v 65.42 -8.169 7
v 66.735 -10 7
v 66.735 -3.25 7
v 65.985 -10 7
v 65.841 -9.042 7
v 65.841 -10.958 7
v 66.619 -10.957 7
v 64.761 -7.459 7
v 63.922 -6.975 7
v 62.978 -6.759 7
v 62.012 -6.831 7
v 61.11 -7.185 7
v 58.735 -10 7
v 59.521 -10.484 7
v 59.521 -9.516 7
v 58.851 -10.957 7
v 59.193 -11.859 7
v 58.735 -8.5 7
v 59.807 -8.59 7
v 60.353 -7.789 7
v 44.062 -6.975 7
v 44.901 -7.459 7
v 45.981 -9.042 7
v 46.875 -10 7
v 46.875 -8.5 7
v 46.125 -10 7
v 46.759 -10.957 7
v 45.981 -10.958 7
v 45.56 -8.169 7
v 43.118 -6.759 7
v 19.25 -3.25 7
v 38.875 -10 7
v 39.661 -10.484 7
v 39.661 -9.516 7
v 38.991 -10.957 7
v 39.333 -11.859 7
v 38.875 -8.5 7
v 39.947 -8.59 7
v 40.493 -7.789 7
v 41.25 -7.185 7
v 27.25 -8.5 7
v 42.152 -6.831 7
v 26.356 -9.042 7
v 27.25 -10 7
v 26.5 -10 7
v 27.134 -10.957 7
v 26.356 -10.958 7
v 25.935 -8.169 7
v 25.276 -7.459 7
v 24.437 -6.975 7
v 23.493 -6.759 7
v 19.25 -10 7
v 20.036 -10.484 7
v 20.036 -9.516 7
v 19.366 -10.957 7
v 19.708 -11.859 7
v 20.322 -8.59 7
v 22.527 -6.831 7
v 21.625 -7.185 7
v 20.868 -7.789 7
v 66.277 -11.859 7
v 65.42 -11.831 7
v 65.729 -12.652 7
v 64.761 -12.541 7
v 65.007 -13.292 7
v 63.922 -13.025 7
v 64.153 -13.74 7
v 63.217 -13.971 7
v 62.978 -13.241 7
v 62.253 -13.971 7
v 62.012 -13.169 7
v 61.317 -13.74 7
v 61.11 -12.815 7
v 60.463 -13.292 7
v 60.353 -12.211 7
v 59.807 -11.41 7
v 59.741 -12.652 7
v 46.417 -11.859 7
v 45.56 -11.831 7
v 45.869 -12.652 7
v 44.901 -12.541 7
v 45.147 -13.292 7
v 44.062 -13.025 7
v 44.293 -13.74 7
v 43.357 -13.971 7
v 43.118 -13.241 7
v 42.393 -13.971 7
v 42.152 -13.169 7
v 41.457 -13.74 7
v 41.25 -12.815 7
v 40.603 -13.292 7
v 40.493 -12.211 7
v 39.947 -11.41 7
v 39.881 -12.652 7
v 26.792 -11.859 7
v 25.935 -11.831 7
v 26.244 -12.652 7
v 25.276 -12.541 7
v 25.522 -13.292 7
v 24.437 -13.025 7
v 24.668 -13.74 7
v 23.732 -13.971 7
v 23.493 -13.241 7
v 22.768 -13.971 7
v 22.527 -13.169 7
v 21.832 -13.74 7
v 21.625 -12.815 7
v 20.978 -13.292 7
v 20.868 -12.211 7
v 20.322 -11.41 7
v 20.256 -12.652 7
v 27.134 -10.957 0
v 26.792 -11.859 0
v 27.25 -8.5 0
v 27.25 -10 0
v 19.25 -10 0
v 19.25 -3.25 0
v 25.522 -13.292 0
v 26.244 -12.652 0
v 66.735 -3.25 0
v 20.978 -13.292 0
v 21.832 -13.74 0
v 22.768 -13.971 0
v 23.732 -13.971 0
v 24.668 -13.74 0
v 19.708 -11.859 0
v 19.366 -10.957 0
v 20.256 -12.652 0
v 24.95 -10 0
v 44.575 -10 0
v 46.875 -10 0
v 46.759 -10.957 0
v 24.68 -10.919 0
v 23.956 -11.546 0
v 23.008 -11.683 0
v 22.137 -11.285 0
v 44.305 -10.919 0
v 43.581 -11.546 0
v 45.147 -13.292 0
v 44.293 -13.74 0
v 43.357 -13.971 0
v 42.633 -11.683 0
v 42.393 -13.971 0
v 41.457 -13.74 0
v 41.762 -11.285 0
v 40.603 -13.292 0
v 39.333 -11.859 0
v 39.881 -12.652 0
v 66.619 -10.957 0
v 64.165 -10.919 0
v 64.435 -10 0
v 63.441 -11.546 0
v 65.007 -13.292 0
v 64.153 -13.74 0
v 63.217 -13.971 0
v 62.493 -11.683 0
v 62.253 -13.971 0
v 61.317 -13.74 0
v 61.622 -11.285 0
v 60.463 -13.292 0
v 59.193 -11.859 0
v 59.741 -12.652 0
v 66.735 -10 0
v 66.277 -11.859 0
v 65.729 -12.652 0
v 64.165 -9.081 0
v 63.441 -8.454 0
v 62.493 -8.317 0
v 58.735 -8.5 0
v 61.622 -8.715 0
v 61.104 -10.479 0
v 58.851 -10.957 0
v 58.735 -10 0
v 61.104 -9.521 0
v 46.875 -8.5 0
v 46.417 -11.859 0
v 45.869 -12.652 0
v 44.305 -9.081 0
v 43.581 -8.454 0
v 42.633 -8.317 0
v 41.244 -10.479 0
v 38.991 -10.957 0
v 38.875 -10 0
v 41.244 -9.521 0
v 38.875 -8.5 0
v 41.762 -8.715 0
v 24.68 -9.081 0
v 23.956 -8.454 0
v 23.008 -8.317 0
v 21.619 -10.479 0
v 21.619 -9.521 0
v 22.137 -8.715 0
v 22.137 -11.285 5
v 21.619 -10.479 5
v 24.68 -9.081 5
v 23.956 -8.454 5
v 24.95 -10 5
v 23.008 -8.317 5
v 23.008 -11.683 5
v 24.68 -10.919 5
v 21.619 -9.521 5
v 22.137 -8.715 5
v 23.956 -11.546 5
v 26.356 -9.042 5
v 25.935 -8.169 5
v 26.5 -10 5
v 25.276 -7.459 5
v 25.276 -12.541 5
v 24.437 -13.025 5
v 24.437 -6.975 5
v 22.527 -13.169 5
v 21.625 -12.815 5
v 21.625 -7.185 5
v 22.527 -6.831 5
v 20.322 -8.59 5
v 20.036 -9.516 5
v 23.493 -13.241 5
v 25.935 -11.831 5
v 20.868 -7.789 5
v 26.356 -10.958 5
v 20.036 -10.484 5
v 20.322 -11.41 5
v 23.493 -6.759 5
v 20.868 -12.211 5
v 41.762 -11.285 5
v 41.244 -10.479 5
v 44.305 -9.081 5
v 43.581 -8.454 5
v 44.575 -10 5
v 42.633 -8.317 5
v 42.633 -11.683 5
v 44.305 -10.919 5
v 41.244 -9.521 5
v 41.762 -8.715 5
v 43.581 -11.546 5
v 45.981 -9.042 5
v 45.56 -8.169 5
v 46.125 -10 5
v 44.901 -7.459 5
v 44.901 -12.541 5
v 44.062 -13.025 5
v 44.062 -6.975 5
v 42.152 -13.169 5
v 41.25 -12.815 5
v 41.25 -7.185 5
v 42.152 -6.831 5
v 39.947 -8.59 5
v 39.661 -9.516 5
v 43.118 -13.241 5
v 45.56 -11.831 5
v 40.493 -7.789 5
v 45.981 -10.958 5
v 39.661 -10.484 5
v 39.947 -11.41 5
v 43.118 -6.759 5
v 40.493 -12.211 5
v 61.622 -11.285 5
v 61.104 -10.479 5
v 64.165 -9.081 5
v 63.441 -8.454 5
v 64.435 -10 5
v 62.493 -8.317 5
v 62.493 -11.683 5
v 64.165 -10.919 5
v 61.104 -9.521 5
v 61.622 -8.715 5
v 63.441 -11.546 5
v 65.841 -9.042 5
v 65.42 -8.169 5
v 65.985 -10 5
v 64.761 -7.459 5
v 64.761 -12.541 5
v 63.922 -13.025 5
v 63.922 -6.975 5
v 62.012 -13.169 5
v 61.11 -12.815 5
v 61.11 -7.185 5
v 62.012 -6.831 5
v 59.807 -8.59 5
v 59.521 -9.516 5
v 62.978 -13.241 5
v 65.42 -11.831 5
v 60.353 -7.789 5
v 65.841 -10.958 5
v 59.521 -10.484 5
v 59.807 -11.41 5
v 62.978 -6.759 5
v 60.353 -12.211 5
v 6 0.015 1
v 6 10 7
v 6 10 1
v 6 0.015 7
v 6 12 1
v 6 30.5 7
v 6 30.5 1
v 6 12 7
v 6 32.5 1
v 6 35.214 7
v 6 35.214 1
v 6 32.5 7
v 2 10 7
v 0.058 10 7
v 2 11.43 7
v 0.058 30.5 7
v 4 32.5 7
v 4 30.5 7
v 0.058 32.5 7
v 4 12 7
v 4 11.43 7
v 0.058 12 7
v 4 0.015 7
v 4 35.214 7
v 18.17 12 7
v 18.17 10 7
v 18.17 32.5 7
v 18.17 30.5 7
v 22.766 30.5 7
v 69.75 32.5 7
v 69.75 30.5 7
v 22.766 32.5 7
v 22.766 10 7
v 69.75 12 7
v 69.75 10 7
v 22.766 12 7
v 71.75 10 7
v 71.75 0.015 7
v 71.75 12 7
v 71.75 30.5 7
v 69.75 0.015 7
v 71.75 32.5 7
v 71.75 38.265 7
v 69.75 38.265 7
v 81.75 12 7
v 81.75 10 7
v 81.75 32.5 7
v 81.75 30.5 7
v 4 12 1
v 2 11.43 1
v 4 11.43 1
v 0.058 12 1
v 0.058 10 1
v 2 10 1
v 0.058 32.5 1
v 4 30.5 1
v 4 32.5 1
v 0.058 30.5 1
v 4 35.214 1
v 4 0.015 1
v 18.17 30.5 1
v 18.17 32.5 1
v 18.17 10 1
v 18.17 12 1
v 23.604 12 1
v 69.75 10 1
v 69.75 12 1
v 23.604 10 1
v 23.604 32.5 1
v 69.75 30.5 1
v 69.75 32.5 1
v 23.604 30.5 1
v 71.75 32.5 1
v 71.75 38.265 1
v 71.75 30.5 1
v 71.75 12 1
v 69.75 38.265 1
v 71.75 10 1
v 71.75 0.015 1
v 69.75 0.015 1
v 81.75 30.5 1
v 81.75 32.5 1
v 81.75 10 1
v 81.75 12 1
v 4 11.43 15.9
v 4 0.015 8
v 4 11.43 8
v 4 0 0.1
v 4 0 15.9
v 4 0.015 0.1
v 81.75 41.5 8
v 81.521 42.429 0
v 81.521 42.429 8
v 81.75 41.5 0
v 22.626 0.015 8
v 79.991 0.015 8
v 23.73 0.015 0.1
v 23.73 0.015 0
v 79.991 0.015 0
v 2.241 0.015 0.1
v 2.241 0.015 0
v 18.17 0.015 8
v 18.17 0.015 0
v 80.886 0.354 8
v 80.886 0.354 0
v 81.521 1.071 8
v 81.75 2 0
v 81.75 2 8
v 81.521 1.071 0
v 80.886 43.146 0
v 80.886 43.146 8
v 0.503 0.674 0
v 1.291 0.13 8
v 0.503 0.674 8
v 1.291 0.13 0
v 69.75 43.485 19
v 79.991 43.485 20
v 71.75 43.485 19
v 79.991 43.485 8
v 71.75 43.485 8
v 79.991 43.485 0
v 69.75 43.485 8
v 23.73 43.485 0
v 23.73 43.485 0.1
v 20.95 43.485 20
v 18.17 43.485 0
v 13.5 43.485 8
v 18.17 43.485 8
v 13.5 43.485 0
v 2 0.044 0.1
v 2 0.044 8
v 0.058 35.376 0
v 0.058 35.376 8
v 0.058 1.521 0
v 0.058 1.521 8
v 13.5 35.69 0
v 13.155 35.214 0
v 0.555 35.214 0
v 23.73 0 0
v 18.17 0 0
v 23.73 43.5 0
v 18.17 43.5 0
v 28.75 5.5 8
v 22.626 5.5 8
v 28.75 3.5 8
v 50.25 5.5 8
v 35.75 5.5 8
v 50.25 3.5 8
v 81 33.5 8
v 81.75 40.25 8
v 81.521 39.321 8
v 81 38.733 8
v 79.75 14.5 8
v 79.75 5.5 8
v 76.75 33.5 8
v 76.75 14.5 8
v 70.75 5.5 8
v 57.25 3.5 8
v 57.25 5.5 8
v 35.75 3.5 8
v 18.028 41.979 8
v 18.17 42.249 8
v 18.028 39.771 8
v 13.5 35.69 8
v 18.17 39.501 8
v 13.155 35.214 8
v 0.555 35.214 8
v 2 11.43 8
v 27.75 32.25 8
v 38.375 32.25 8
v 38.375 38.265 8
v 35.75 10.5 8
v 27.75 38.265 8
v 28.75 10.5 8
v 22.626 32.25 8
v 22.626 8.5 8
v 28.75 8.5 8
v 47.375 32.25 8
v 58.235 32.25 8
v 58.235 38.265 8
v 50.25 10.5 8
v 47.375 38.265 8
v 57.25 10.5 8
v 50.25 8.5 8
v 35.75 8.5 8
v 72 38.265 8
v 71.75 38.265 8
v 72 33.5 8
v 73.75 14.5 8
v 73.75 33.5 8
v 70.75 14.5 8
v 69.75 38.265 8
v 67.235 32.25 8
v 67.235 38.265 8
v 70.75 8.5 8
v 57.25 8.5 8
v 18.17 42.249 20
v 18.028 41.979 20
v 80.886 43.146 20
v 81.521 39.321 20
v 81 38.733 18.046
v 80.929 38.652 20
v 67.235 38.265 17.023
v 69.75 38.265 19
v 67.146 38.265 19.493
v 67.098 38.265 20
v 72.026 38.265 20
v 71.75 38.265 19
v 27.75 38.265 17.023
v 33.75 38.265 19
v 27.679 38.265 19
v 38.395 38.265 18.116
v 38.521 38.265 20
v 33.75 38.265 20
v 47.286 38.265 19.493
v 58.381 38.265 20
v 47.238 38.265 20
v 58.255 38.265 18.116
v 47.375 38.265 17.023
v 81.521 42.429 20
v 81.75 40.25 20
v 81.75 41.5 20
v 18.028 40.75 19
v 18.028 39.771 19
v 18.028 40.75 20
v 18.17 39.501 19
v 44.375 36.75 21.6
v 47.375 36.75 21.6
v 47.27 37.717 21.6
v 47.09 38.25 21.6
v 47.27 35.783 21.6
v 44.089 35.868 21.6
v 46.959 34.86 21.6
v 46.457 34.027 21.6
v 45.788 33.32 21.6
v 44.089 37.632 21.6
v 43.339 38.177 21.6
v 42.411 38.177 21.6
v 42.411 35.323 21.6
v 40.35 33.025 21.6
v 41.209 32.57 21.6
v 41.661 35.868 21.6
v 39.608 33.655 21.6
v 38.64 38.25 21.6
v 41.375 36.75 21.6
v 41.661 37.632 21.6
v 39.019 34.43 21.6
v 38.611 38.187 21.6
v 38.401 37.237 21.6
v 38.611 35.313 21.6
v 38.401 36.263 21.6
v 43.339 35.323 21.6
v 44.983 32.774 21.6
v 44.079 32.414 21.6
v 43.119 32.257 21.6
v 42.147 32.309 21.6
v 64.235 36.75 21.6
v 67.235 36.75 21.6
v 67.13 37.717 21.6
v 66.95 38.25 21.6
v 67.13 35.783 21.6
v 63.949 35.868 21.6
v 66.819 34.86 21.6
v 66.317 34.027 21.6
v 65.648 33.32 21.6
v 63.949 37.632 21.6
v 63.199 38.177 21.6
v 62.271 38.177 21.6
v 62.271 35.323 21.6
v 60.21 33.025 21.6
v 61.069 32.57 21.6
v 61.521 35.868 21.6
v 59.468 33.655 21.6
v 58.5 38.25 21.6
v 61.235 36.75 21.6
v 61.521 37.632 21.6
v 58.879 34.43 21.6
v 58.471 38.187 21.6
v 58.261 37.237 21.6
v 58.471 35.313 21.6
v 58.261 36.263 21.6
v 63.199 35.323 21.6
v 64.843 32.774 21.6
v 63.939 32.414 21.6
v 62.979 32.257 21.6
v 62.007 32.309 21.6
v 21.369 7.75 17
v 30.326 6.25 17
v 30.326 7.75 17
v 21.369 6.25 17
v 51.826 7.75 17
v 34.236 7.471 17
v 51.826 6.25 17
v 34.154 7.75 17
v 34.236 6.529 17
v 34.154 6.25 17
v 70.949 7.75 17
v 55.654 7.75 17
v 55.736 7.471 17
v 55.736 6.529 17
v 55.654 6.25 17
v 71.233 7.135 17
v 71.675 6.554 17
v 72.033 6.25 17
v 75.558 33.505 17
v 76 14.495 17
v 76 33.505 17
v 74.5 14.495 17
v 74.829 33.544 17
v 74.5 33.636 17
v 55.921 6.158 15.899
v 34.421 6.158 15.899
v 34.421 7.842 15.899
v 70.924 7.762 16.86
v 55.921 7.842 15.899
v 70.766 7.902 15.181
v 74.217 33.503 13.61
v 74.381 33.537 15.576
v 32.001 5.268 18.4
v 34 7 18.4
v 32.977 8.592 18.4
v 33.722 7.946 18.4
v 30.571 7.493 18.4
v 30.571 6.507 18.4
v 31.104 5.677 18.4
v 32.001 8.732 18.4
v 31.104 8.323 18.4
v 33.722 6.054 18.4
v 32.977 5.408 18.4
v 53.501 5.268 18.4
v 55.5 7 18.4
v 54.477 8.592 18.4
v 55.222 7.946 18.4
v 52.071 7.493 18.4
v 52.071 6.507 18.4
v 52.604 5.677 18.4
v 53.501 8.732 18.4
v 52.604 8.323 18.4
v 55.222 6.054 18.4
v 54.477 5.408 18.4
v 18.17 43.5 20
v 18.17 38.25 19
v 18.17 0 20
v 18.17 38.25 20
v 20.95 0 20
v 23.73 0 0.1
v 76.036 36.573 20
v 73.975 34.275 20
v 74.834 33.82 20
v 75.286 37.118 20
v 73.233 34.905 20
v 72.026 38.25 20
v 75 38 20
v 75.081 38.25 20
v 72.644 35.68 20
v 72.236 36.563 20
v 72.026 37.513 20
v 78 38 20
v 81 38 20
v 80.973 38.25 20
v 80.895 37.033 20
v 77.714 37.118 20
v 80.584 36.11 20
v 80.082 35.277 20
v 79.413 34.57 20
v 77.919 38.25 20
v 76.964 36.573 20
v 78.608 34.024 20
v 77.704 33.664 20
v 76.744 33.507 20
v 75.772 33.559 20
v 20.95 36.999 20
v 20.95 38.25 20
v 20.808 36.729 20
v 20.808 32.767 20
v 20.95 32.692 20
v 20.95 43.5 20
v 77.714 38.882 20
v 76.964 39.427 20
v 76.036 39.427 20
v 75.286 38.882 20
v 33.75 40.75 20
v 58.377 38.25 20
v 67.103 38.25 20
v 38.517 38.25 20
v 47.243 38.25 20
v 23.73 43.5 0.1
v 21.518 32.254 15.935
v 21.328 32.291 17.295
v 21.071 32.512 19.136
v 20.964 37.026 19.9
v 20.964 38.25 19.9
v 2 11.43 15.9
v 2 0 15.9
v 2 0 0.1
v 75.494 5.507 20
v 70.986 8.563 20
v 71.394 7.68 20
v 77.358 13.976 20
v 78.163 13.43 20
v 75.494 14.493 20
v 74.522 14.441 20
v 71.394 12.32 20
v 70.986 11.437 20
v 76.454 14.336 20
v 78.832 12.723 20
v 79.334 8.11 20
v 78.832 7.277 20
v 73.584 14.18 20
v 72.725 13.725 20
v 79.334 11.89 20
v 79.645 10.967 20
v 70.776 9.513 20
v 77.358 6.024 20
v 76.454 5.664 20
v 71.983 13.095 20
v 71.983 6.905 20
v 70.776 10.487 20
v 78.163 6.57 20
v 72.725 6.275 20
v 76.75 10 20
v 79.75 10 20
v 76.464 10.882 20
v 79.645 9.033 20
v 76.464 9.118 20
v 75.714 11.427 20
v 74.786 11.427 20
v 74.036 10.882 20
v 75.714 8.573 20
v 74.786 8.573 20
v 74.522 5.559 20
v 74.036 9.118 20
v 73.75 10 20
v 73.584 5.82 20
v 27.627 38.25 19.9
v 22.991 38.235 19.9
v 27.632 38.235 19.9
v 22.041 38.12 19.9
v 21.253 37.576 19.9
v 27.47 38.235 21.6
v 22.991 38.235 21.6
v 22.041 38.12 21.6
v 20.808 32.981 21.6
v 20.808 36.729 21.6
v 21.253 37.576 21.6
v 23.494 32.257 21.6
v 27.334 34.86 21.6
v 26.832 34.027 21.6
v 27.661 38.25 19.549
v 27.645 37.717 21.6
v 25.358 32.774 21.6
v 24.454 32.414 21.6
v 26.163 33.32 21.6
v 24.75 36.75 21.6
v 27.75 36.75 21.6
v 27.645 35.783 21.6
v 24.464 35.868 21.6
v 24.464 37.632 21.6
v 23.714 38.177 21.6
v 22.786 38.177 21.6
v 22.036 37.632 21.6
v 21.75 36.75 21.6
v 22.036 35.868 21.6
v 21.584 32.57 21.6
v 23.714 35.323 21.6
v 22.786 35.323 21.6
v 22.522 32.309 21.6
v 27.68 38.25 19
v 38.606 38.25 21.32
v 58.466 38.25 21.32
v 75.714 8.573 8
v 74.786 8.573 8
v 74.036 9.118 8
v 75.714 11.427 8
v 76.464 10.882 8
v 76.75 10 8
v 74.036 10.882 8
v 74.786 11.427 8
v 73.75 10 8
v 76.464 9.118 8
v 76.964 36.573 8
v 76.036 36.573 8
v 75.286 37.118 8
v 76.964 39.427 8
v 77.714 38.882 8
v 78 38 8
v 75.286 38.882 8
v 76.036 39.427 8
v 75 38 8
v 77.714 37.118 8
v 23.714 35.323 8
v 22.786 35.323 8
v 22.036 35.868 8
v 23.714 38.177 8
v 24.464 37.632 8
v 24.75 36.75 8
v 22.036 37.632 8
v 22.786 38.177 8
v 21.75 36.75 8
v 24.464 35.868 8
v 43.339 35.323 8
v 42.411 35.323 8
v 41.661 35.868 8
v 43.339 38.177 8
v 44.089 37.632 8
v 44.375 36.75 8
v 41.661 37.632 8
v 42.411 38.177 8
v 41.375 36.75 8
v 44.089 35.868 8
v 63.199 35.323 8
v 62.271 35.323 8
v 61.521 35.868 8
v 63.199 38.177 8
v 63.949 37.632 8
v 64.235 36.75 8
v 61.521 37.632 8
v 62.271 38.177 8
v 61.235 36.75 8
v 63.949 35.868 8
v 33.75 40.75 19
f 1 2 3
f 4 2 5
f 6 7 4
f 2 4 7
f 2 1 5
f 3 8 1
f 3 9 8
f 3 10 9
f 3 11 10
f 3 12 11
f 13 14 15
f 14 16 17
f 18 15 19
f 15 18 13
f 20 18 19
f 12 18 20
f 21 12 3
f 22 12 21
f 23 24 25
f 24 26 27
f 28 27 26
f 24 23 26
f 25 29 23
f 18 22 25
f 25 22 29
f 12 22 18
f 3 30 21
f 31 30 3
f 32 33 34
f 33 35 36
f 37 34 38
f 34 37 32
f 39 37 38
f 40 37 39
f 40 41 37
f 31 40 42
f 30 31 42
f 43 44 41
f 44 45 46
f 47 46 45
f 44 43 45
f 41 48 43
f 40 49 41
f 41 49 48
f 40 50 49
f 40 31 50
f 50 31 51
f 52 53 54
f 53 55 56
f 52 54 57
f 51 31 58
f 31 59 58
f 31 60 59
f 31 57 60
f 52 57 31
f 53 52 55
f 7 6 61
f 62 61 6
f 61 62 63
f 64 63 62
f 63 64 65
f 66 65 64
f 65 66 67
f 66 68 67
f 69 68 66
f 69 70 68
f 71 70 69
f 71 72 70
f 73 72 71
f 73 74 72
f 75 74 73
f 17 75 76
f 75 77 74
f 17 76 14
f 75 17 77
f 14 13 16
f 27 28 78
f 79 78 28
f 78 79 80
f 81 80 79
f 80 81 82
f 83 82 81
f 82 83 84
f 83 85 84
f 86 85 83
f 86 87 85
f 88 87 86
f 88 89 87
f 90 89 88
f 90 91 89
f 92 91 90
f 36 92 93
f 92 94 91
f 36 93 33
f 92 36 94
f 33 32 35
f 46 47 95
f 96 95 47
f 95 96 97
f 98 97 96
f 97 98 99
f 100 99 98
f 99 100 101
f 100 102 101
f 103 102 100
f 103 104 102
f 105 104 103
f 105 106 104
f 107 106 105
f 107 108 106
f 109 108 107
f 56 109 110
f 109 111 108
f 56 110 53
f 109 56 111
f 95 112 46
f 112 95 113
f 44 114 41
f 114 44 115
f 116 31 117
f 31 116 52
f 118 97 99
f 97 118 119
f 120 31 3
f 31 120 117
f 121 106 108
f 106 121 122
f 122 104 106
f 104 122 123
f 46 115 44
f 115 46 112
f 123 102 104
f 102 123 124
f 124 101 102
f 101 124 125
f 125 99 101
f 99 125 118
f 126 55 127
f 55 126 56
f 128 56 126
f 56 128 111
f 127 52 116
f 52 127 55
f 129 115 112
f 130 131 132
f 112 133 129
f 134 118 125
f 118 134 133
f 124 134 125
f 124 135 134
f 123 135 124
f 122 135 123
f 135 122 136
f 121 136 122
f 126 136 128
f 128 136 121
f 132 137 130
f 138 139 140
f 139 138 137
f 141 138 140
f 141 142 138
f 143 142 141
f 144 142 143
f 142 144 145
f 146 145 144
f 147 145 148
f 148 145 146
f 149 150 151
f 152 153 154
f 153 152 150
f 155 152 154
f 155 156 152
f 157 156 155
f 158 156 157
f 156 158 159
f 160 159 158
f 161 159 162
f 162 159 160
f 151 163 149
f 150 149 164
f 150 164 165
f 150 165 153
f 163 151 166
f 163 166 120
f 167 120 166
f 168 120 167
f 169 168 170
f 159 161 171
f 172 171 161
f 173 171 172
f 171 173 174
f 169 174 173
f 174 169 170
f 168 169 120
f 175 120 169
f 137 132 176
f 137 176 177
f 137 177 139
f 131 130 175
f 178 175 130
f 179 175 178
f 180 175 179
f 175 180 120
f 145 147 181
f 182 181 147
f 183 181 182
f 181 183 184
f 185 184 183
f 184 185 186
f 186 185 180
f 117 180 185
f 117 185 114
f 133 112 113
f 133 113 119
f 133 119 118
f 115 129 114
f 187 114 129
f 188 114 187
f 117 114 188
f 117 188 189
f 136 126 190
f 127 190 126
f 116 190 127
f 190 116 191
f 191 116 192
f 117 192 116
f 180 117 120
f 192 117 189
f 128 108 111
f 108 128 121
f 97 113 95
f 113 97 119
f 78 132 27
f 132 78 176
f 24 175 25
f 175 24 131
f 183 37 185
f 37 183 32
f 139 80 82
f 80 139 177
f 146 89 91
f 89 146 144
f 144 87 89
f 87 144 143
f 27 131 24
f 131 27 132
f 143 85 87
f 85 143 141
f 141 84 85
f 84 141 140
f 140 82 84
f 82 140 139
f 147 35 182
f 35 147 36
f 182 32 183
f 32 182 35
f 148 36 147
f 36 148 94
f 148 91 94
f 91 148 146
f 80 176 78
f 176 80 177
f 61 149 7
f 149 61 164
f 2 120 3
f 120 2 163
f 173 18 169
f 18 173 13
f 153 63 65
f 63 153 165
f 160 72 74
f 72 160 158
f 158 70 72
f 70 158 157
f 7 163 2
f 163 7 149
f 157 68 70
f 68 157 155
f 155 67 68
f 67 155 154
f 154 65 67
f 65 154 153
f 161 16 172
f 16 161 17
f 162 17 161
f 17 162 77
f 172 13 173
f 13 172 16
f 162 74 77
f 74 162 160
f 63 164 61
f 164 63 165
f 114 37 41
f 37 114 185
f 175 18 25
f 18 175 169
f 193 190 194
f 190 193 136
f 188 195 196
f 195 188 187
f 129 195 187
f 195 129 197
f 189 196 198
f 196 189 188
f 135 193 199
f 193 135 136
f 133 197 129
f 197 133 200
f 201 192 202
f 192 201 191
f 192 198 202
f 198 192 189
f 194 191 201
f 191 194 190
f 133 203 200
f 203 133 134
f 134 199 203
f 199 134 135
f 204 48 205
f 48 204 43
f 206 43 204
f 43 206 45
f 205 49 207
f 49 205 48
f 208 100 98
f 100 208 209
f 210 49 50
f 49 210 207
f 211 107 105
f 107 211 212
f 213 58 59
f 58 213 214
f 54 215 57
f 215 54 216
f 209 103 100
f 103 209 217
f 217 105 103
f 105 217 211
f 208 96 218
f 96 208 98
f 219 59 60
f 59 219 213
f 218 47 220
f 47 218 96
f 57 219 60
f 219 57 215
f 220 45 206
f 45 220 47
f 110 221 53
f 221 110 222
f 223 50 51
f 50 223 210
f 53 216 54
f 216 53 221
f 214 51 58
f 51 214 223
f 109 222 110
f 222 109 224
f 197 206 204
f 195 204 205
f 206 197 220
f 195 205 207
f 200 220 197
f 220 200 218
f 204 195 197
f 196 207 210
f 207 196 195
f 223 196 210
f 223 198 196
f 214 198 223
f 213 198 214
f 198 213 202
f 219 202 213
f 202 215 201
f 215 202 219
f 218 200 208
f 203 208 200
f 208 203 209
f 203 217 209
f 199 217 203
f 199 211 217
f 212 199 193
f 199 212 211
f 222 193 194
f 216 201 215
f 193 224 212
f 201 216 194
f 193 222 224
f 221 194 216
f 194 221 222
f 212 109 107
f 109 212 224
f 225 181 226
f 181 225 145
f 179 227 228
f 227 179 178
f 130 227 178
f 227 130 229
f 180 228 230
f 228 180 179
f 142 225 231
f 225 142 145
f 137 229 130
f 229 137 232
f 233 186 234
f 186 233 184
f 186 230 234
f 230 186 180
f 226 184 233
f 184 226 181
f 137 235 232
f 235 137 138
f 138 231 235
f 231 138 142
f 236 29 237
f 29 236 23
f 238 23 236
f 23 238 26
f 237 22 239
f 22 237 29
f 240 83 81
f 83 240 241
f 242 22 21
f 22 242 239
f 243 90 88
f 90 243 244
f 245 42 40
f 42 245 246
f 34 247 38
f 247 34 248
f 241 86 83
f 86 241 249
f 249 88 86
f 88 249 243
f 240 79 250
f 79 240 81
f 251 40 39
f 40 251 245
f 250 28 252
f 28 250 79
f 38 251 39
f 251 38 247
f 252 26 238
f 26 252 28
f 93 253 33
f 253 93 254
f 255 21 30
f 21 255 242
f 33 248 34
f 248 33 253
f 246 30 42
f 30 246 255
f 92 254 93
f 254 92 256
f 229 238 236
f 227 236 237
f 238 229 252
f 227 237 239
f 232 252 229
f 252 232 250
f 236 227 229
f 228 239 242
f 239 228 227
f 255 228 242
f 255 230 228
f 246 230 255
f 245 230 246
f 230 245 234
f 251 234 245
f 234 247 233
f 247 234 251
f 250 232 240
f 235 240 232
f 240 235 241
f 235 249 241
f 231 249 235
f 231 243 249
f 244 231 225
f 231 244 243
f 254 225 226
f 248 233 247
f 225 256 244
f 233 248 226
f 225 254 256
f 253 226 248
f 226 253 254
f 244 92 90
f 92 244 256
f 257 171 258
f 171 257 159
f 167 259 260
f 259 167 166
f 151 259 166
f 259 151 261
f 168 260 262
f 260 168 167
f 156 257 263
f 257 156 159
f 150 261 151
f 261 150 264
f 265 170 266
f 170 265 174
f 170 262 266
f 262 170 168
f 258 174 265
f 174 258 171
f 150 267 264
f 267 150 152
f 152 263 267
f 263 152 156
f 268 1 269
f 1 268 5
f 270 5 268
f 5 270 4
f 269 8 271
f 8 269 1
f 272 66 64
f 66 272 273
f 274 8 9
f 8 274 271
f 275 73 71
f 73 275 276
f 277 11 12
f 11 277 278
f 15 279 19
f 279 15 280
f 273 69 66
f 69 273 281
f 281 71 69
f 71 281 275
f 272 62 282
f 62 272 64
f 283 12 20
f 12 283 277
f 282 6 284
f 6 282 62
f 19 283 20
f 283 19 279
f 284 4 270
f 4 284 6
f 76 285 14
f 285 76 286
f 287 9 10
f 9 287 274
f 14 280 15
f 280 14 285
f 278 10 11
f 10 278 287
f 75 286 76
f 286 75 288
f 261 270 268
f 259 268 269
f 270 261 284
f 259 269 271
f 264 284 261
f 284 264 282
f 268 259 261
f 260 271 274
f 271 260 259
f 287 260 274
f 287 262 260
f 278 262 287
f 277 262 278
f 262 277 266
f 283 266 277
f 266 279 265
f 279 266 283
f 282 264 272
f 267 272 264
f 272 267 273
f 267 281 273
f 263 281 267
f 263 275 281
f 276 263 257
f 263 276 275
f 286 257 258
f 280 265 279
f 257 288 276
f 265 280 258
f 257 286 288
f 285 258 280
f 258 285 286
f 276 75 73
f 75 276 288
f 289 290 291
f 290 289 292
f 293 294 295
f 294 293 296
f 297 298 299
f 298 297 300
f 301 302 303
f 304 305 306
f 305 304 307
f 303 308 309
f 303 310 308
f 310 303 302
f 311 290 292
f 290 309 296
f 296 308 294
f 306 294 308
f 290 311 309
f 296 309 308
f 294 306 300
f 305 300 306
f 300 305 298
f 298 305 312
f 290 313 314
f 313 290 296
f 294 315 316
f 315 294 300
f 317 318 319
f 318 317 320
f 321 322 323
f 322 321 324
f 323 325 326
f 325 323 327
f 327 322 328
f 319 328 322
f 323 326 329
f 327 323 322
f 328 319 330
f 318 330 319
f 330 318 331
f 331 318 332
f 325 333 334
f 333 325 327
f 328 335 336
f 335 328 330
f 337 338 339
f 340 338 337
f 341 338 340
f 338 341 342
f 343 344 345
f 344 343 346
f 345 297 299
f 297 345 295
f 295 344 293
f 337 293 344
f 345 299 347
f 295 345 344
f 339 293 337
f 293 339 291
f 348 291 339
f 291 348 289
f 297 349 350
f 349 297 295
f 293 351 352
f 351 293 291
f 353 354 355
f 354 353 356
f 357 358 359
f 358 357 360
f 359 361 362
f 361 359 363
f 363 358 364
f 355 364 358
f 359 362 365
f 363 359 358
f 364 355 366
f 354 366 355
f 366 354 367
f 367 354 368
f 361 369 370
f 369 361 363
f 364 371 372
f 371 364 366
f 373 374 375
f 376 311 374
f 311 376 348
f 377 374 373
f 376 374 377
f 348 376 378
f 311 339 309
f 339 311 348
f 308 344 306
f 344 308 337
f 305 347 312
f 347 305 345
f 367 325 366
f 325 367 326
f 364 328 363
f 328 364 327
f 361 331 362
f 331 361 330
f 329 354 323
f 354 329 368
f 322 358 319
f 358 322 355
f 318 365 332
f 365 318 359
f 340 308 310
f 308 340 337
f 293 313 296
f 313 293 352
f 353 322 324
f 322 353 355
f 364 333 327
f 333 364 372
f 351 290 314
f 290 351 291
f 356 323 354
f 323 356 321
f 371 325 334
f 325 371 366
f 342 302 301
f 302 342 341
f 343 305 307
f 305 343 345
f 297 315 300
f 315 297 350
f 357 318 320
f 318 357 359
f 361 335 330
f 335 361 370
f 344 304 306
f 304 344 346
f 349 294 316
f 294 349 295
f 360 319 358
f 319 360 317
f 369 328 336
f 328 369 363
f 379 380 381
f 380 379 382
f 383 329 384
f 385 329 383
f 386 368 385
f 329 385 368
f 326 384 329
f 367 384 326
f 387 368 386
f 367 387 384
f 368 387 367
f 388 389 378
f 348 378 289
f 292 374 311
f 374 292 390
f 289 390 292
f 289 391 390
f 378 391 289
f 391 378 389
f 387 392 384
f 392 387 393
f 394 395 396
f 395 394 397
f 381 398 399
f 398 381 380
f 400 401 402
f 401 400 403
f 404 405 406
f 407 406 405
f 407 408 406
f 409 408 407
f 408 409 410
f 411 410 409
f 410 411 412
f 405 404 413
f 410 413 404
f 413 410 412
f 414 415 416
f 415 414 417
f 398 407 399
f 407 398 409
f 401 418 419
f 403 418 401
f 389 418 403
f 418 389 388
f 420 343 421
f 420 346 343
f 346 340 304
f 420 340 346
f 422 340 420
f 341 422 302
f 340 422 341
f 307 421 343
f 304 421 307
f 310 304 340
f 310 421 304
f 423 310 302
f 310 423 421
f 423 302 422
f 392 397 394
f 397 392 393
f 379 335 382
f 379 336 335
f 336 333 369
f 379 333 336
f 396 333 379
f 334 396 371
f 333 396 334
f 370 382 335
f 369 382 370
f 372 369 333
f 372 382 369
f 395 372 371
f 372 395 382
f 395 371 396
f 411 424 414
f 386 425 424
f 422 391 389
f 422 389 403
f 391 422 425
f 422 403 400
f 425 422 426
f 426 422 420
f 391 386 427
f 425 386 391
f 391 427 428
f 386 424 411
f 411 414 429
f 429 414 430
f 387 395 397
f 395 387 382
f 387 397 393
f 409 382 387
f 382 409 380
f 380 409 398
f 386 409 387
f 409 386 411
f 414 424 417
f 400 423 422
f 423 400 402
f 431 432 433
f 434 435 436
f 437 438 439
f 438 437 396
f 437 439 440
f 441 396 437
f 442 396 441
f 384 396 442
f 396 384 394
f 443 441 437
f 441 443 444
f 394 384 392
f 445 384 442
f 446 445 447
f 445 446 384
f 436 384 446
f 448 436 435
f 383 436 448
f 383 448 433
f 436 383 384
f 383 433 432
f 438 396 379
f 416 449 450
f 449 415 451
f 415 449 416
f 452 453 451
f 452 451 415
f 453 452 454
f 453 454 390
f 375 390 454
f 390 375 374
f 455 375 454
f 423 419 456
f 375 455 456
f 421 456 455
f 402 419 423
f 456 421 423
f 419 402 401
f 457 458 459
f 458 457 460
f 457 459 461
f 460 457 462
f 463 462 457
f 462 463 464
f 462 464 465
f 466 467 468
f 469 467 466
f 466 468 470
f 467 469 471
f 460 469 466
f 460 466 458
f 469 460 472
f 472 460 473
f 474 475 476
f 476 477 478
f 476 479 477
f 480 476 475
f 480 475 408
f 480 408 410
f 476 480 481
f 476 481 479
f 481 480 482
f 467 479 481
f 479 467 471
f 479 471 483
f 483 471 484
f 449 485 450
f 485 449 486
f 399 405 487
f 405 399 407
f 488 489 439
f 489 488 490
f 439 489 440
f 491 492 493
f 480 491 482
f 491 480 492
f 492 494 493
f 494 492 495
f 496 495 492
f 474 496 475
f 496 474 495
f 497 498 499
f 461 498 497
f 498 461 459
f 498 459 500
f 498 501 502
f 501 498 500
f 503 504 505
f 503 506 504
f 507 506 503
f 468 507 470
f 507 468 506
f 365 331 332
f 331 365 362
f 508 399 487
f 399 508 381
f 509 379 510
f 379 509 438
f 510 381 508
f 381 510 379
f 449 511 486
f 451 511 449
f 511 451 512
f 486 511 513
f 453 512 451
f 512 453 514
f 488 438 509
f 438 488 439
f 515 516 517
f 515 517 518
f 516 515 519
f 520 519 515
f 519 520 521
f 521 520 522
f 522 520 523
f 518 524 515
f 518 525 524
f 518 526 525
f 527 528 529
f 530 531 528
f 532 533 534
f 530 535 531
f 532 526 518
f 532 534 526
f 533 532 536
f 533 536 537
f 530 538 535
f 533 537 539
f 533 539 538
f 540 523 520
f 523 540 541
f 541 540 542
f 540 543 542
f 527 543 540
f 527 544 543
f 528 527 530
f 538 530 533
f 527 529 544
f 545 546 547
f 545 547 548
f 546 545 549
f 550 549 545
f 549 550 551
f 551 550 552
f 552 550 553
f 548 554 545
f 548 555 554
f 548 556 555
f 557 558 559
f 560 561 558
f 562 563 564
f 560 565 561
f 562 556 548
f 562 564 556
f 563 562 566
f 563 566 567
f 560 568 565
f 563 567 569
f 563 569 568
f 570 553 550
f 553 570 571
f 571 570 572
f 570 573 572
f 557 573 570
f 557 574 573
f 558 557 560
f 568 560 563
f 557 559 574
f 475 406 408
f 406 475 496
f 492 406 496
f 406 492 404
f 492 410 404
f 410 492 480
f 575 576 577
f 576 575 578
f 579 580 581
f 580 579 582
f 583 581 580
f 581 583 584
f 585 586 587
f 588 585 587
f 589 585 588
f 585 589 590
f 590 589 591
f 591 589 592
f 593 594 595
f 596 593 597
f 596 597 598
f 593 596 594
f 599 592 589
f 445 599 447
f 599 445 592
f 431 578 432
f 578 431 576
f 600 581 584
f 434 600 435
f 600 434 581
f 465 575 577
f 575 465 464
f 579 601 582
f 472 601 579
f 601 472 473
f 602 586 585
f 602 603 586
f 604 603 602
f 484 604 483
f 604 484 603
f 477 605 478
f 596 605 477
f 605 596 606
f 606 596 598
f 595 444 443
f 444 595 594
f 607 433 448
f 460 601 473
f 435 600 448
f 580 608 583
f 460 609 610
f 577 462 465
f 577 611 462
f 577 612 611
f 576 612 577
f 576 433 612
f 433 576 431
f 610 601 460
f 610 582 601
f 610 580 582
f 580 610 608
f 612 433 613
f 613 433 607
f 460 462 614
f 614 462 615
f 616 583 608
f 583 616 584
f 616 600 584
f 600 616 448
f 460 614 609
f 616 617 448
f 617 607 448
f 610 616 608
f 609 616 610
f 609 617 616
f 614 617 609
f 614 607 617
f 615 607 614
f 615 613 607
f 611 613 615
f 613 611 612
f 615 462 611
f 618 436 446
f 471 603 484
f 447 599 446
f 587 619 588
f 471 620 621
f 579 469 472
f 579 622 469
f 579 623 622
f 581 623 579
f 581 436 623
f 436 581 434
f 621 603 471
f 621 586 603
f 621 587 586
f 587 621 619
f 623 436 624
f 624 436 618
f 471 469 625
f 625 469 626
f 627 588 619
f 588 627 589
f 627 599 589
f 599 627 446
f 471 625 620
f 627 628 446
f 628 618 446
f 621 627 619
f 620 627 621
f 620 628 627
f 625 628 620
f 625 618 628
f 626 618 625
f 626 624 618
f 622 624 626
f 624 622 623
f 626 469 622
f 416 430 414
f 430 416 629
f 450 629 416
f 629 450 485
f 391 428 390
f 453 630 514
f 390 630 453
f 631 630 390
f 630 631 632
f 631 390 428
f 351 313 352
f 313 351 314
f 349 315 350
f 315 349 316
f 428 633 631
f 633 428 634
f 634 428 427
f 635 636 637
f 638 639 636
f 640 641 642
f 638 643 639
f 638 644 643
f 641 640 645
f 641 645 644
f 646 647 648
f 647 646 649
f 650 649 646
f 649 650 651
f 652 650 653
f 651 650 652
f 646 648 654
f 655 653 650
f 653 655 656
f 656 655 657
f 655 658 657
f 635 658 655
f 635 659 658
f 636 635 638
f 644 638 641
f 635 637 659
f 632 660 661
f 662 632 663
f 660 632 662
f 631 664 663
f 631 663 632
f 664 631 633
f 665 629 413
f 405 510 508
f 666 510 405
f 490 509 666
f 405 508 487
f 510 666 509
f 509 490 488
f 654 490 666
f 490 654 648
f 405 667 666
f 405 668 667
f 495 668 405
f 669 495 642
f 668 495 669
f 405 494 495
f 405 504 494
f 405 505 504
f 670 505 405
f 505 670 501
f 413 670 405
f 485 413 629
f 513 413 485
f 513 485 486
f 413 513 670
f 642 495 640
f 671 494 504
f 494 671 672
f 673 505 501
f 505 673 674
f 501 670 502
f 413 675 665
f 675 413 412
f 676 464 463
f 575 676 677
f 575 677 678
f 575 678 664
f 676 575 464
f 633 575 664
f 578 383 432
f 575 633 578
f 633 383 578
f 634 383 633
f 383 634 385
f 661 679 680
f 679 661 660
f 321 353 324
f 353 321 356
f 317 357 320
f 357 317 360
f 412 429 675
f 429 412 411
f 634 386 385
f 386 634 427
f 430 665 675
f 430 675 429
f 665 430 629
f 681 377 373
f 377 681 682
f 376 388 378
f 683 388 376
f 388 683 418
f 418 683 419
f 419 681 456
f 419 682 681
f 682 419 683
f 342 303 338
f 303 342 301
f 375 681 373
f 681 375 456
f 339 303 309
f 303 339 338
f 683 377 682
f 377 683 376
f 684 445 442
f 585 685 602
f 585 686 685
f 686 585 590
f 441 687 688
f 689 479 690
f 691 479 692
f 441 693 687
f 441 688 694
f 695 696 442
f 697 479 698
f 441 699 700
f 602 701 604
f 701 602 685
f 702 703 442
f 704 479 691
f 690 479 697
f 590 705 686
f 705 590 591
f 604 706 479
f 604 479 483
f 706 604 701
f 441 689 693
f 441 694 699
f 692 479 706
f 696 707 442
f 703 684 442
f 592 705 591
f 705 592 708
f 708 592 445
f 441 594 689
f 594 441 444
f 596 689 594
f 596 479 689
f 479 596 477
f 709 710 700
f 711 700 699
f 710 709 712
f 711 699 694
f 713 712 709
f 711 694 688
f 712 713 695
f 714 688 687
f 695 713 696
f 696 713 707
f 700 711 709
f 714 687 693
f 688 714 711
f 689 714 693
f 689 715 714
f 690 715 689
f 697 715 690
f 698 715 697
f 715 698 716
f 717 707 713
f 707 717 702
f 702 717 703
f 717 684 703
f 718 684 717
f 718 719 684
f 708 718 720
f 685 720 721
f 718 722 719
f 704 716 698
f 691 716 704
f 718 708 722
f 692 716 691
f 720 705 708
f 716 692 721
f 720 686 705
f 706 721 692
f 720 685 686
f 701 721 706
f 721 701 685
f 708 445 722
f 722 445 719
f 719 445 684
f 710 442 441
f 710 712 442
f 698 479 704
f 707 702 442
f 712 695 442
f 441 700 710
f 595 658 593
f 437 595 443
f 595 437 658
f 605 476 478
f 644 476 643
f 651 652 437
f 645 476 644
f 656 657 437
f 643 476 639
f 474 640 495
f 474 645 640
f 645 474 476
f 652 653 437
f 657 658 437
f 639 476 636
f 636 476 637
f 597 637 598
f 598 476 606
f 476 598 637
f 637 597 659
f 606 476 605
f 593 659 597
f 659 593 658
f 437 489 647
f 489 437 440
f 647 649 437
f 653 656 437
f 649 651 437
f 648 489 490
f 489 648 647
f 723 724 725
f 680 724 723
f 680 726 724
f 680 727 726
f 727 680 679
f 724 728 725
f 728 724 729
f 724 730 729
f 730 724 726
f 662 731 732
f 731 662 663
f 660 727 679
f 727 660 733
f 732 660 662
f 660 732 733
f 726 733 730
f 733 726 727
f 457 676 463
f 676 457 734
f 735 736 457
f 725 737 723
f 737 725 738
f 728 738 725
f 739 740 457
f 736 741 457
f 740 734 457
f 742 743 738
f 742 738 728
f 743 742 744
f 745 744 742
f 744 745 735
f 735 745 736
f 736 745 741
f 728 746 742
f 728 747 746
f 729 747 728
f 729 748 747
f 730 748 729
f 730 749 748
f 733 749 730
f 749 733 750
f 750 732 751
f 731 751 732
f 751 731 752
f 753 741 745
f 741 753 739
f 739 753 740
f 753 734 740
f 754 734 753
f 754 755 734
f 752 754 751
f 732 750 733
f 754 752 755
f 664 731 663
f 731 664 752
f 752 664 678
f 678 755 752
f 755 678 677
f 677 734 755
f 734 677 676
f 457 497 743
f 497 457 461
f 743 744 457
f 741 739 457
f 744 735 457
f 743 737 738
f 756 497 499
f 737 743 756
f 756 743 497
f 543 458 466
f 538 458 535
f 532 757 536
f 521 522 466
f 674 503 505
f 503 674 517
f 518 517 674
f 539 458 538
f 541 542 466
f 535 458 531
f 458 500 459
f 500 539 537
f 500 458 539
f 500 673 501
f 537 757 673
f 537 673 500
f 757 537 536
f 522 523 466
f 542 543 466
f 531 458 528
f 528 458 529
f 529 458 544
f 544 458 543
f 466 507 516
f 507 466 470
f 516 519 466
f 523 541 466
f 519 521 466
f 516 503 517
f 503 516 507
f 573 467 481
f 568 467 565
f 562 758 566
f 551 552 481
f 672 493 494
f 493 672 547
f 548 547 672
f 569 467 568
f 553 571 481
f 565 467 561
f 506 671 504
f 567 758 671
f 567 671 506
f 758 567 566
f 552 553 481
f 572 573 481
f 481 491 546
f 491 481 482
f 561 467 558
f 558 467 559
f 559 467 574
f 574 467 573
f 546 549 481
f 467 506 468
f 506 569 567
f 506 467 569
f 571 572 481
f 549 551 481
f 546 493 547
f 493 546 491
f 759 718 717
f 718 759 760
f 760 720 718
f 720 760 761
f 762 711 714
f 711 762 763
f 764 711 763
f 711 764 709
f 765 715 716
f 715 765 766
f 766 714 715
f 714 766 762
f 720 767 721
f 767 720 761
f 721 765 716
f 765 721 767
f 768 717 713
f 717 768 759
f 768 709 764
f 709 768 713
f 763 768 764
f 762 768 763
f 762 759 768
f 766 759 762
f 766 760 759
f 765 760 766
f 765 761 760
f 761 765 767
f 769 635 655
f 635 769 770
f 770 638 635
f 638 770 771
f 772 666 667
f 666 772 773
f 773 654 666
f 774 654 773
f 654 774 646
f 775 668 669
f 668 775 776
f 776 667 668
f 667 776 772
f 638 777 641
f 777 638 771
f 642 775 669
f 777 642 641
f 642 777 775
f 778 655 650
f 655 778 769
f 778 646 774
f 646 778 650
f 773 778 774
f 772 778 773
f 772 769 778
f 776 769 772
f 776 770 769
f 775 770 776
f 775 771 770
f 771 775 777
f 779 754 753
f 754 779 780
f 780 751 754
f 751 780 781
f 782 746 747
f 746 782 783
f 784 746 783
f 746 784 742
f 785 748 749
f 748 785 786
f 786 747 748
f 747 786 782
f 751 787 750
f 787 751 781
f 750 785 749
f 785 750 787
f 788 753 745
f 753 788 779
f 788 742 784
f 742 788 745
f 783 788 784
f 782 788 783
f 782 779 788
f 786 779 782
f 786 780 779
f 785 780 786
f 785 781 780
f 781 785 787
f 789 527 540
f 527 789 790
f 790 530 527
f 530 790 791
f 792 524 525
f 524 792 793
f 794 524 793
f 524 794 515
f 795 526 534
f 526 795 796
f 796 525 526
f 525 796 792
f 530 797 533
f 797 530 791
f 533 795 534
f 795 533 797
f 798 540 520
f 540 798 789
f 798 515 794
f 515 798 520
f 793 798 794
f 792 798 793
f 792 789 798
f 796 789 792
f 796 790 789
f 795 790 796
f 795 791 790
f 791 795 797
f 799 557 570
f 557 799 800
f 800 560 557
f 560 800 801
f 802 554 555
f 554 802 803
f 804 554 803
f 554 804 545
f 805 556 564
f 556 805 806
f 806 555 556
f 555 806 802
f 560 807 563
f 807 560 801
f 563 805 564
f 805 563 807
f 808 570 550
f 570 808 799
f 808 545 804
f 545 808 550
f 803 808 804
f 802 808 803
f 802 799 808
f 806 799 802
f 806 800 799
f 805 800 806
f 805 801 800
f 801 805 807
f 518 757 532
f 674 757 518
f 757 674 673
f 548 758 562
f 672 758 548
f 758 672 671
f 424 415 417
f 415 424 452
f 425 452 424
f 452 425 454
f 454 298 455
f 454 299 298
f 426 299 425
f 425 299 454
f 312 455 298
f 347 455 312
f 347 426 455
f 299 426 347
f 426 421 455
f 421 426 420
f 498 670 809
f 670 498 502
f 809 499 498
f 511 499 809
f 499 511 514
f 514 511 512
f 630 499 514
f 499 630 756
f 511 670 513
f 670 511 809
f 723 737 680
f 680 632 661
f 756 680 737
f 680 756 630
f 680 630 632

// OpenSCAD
inch = 25.4;
hq = true;
clr = 0.2;

$fs = hq ? 1 : 4;
$fa = hq ? 1 : 4;
eps = 0.1;

// Constants from the Eagle file

// Board dimensions
board_x = 0;
board_y = 0;
board_w = 81.75;
board_h = 43.5;
board_r = 2;

// Teensy location
teensy_cx =  9.08;
teensy_cy = 19.05;
teensy_w =  7 * 2.54;
teensy_h = 14 * 2.54;
teensy_paddle_w = 20.75;

// Tactile switches
sw1_x = 32.25;
sw1_y = 7;
sw2_x = 53.75;
sw2_y = 7;
sw_d = 2.5;

// Screw holes
hole1_x = 75.25;
hole1_y = 10;
hole2_x = 76.5;
hole2_y = 38;
hole_d = 3;
hole_clr = 0;

// Paddles
paddle_y = 3.5;

// Spine
spine_y = 38.25;
spine_cx2 = (37.25 + 48.5) / 2;
spine_cx3 = (58.75 + 66.72) / 2;

// Header
header_cx = 7.79;
header_cy = 39.73;
header_w = 3 * 2.54;
header_h = 2 * 2.54;

// End Eagle constants

spine_screw_y = spine_y - hole_d / 2;
teensy_rx = teensy_cx + teensy_w / 2;
spine_cx1 = teensy_paddle_w + hole_d / 2 + 1;

// Z heights
base_z = 1 + 7;
deck_z = base_z + 9 + 3;
top_z = deck_z + 1.6;
sw_z = deck_z - 1.6;
teensy_z = deck_z - 4.1;
pin_z = deck_z - 9;
bulkhead_z = deck_z - 3;

// The booboo
booboo_x0 = 19.5 - 2;
booboo_x1 = 31.75 + 2;
booboo_y = 39.5;
booboo_h = 2 * (booboo_y - spine_y);
booboo_t = 1.0;

module centered_cube(size, zt=0) {
    translate([-size[0] / 2, -size[1] / 2, zt])
        cube(size);
}

module round_rect(size, r) {
    hull()
        for (x = [r, size[0] - r]) for ( y = [r, size[1] - r]) {
            translate([x, y, 0])
                cylinder(r=r, h=size[2]);
        }
}


module base() {
    difference() {
        round_rect([board_w, board_h, base_z], board_r);
        for (x = [4, 20, board_w - 12])
            translate([x, -eps, 1])
     #           cube([2, board_h + 2 * eps, base_z - 2]);
        for (y = [10, board_h - 13])
            translate([-eps, y, 1])
     #           cube([board_w + 2 * eps, 2, base_z - 2]);
    }
}

module spine() {
    lx = teensy_rx;
    difference() {
        translate([lx, spine_y, eps])
            round_rect([board_w - lx, board_h - spine_y, top_z - eps], r=board_r);
        // strain relief
        translate([board_w - 12, spine_y - eps, base_z])
            cube([2, board_h, deck_z - base_z - 1]);
    }
}

module bulkheads() {
    bt0 = 3;
    bt1 = 1.5;
    bx = teensy_rx + clr;
    by = sw1_y;
    bw = hole1_x - bx;
    bh = board_h - by;
    translate([bx + eps, by, 0])
        hull() {
            translate([0, -bt0/2, base_z - eps])
                cube([bw + bt0/2, bt0, eps]);
            translate([0, -bt1/2, bulkhead_z - eps])
                cube([bw + bt1/2, bt1, eps]);
        }
    translate([bx + bw, board_h, 0])
        rotate(-90)
            hull() {
                translate([eps, -bt0/2, base_z - eps])
                    cube([bh + bt0/2 - eps, bt0, eps]);
                translate([eps, -bt1/2, bulkhead_z - eps])
                    cube([bh + bt1/2 - eps, bt1, eps]);
            }
}

module spine_cutout() {
    translate([10 - eps, spine_y, deck_z])
         cube([board_w, board_h, top_z]);
     // translate([0, 0, deck_z])
     //     cube([teensy_paddle_w, board_h, top_z]);
}

module screw_support(x, y, z) {
    support_d = hole_d + 2 * 3;
    hull() {
        translate([x, y, base_z - eps])
            centered_cube([support_d, support_d, eps]);
        translate([x, y, z - eps])
            cylinder(d=support_d, h = eps);
    }
}

module assign_screw_supports() {
    screw_support(hole1_x, hole1_y, deck_z);
    screw_support(hole2_x, hole2_y, deck_z);
}

module spine_screw_supports() {
    y = spine_screw_y;
    intersection() {
        screw_support(spine_cx1, spine_screw_y, top_z);
        union() {
            cube([board_w, board_h, deck_z - eps]);
            translate([teensy_paddle_w, 0, eps])
                round_rect([board_w, spine_y, top_z + eps], r=2);
        }
    }
    screw_support(spine_cx2, spine_screw_y, top_z);
    screw_support(spine_cx3, spine_screw_y, top_z);
}

module screw_hole(x, y, z) {
    translate([x, y, z])
        cylinder(d=hole_d + hole_clr, h=deck_z + 3);
}

module assign_screw_holes() {
    screw_hole(hole1_x, hole1_y, base_z);
    screw_hole(hole2_x, hole2_y, base_z);
}

module spine_screw_holes() {
    for (x = [spine_cx1, spine_cx2, spine_cx3])
        screw_hole(x, spine_screw_y, base_z);
}

module switch_pillars() {
    module switch_pillar(x, y) {
        mbh = 2 * (y - paddle_y);
        mbw = mbh;
        translate([x, y, 0])
            hull() {
                centered_cube([mbw, mbh, eps], zt=base_z - eps);
                translate([0, 0, sw_z - eps])
                    cylinder(d=sw_d + 1, h=eps);
            }
    }
    switch_pillar(sw1_x, sw1_y);
    switch_pillar(sw2_x, sw2_y);
}

module under_teensy() {
    uw = teensy_paddle_w - teensy_rx;
    translate([teensy_rx + clr, 0, 0])
        hull() {
            cube([2 * uw, board_h, eps]);
            translate([0, 0, deck_z - eps])
                cube([uw, board_h, eps]);
        }
    translate([2, 0, eps])
        cube([2, 4.5 * 2.54, teensy_z - eps]);
}

module header_cutout() {
    hdr_clr = 2;
    translate([-eps, header_cy - header_h / 2 - hdr_clr, -eps])
        round_rect([header_cx + header_w / 2 + hdr_clr, board_h, deck_z + 2 * eps],
                   r=0.5);
}

module booboo_cutout() {
    translate([booboo_x0, booboo_y - booboo_h / 2, deck_z - booboo_t])
        cube([booboo_x1 - booboo_x0, booboo_h, booboo_t + eps]);
}

module substrate() {
    difference() {
        union() {
            base();
            spine();
            bulkheads();
            switch_pillars();
            under_teensy();
            assign_screw_supports();
            spine_screw_supports();
        };
        assign_screw_holes();
        spine_screw_holes();
        spine_cutout();
        header_cutout();
        booboo_cutout();
    };
}

module clips() {
    clip_t = 7;
    od = hole_d + 5;
    x0 = spine_cx1 - od/2;
    x1 = spine_cx3 + od/2;
    y = board_h - spine_screw_y;
    y1 = spine_y - spine_screw_y;
    y2 = board_h - spine_y;

    difference() {
        union() {
            for (x = [spine_cx1, spine_cx2, spine_cx3])
                translate([x, 0, 0])
                    hull() {
                        cylinder(d=od, h=clip_t);
                        translate([-od/2, y - eps, 0])
                            cube([od, eps, clip_t]);
                    }
            translate([x0, y1, 0])
                cube([x1 - x0, y2, clip_t]);
        }
        for (x = [spine_cx1, spine_cx2, spine_cx3])
            translate([x, 0, 0]) {
                cylinder(d=hole_d + hole_clr + 2 * clr, h=3 * clip_t, center=true);
                translate([0, 0, clip_t - 2])
                    cylinder(d=6.5, h=3);
            }
    }
}

//module clips() {
//    for (x = [20, 40, 60])
//        translate([x, -10, 0])
//            clip();
//}

translate([0, -10, 0])
    clips();
substrate();
